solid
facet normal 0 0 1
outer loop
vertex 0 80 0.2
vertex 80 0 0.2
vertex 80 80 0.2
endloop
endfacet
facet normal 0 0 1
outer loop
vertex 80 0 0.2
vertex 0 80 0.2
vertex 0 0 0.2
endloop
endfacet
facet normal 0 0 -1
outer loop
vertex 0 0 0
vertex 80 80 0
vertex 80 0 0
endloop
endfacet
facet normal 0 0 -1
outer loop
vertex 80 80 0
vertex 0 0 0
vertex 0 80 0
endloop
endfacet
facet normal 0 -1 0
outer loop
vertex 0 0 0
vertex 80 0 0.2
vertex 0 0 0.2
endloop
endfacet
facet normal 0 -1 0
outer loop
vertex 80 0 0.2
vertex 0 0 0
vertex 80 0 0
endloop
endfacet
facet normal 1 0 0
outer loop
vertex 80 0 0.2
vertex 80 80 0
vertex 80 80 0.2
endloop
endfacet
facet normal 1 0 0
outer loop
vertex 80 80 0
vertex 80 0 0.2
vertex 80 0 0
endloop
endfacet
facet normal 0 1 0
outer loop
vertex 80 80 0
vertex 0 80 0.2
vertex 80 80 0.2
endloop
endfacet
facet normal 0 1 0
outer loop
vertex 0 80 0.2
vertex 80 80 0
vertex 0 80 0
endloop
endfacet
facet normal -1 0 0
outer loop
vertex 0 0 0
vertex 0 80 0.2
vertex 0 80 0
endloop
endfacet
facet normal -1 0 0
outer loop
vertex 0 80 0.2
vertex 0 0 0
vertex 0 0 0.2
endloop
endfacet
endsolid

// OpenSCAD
/*
	first-layer-patch — 首层压合补丁（80×80 单层）

	测什么
		一张 80×80、厚度单层的平片。首层是最难的一层：它决定贴床、翘边和
		之后的每一层能不能长在上面。这张片子把首层的状态放大到一眼能看。

	怎么判读
		- 整片均匀半透明、丝与丝之间没有缝、边缘不翘 = 首层合格。
		- 丝之间有缝：喷嘴离床太远（z-offset 正偏），调低。
		- 表面被压得发亮、边缘挤出料被推成小鳍：喷嘴太低（z-offset 负偏）。
		- 四角翘起：床温不够 / 冷却过早 / 首层太慢。
		- 局部发白、粘不住：该处床面有油或不平，清洁或换贴面。
		- patch_h 一般填切片器里的**首层高**（0.2 / 0.24 / 0.28），
		  这样量出来的片厚既是首层高，也是首层是否被压的依据。
		- notch > 0 会在左上角切个方口，用来分辨朝向（判断哪边是 X+）。

	期望值（默认参数）
		STL 体积 1.280 cm³，包围盒 80.00 × 80.00 × 0.20 mm，单实体，水密。
		片厚 = patch_h（默认 0.20 mm）。

	参数
		patch_w/d  补丁宽 / 深 (mm)
		patch_h    单层厚度 (mm)
		notch      左上角缺口边长 (mm)，0 = 不要
*/

/* [补丁尺寸] */
patch_w = 80;     // X
patch_d = 80;     // Y
patch_h = 0.2;    // 单层厚：填切片器的首层高（0.2 / 0.24 / 0.28）

/* [朝向标记] */
notch = 0;        // 左上角切掉 notch × notch，0 = 不切

assert(patch_w > 0 && patch_d > 0, "补丁尺寸必须 > 0");
assert(patch_h > 0 && patch_h <= 1, "patch_h 是单层厚度，应在 (0, 1] mm");
assert(notch >= 0 && notch < min([patch_w, patch_d]) / 2, "notch 太大");

difference() {
	cube([patch_w, patch_d, patch_h]);
	if (notch > 0) {
		translate([-0.01, patch_d - notch, -0.01])
			cube([notch + 0.01, notch + 0.01, patch_h + 0.02]);
	}
}
